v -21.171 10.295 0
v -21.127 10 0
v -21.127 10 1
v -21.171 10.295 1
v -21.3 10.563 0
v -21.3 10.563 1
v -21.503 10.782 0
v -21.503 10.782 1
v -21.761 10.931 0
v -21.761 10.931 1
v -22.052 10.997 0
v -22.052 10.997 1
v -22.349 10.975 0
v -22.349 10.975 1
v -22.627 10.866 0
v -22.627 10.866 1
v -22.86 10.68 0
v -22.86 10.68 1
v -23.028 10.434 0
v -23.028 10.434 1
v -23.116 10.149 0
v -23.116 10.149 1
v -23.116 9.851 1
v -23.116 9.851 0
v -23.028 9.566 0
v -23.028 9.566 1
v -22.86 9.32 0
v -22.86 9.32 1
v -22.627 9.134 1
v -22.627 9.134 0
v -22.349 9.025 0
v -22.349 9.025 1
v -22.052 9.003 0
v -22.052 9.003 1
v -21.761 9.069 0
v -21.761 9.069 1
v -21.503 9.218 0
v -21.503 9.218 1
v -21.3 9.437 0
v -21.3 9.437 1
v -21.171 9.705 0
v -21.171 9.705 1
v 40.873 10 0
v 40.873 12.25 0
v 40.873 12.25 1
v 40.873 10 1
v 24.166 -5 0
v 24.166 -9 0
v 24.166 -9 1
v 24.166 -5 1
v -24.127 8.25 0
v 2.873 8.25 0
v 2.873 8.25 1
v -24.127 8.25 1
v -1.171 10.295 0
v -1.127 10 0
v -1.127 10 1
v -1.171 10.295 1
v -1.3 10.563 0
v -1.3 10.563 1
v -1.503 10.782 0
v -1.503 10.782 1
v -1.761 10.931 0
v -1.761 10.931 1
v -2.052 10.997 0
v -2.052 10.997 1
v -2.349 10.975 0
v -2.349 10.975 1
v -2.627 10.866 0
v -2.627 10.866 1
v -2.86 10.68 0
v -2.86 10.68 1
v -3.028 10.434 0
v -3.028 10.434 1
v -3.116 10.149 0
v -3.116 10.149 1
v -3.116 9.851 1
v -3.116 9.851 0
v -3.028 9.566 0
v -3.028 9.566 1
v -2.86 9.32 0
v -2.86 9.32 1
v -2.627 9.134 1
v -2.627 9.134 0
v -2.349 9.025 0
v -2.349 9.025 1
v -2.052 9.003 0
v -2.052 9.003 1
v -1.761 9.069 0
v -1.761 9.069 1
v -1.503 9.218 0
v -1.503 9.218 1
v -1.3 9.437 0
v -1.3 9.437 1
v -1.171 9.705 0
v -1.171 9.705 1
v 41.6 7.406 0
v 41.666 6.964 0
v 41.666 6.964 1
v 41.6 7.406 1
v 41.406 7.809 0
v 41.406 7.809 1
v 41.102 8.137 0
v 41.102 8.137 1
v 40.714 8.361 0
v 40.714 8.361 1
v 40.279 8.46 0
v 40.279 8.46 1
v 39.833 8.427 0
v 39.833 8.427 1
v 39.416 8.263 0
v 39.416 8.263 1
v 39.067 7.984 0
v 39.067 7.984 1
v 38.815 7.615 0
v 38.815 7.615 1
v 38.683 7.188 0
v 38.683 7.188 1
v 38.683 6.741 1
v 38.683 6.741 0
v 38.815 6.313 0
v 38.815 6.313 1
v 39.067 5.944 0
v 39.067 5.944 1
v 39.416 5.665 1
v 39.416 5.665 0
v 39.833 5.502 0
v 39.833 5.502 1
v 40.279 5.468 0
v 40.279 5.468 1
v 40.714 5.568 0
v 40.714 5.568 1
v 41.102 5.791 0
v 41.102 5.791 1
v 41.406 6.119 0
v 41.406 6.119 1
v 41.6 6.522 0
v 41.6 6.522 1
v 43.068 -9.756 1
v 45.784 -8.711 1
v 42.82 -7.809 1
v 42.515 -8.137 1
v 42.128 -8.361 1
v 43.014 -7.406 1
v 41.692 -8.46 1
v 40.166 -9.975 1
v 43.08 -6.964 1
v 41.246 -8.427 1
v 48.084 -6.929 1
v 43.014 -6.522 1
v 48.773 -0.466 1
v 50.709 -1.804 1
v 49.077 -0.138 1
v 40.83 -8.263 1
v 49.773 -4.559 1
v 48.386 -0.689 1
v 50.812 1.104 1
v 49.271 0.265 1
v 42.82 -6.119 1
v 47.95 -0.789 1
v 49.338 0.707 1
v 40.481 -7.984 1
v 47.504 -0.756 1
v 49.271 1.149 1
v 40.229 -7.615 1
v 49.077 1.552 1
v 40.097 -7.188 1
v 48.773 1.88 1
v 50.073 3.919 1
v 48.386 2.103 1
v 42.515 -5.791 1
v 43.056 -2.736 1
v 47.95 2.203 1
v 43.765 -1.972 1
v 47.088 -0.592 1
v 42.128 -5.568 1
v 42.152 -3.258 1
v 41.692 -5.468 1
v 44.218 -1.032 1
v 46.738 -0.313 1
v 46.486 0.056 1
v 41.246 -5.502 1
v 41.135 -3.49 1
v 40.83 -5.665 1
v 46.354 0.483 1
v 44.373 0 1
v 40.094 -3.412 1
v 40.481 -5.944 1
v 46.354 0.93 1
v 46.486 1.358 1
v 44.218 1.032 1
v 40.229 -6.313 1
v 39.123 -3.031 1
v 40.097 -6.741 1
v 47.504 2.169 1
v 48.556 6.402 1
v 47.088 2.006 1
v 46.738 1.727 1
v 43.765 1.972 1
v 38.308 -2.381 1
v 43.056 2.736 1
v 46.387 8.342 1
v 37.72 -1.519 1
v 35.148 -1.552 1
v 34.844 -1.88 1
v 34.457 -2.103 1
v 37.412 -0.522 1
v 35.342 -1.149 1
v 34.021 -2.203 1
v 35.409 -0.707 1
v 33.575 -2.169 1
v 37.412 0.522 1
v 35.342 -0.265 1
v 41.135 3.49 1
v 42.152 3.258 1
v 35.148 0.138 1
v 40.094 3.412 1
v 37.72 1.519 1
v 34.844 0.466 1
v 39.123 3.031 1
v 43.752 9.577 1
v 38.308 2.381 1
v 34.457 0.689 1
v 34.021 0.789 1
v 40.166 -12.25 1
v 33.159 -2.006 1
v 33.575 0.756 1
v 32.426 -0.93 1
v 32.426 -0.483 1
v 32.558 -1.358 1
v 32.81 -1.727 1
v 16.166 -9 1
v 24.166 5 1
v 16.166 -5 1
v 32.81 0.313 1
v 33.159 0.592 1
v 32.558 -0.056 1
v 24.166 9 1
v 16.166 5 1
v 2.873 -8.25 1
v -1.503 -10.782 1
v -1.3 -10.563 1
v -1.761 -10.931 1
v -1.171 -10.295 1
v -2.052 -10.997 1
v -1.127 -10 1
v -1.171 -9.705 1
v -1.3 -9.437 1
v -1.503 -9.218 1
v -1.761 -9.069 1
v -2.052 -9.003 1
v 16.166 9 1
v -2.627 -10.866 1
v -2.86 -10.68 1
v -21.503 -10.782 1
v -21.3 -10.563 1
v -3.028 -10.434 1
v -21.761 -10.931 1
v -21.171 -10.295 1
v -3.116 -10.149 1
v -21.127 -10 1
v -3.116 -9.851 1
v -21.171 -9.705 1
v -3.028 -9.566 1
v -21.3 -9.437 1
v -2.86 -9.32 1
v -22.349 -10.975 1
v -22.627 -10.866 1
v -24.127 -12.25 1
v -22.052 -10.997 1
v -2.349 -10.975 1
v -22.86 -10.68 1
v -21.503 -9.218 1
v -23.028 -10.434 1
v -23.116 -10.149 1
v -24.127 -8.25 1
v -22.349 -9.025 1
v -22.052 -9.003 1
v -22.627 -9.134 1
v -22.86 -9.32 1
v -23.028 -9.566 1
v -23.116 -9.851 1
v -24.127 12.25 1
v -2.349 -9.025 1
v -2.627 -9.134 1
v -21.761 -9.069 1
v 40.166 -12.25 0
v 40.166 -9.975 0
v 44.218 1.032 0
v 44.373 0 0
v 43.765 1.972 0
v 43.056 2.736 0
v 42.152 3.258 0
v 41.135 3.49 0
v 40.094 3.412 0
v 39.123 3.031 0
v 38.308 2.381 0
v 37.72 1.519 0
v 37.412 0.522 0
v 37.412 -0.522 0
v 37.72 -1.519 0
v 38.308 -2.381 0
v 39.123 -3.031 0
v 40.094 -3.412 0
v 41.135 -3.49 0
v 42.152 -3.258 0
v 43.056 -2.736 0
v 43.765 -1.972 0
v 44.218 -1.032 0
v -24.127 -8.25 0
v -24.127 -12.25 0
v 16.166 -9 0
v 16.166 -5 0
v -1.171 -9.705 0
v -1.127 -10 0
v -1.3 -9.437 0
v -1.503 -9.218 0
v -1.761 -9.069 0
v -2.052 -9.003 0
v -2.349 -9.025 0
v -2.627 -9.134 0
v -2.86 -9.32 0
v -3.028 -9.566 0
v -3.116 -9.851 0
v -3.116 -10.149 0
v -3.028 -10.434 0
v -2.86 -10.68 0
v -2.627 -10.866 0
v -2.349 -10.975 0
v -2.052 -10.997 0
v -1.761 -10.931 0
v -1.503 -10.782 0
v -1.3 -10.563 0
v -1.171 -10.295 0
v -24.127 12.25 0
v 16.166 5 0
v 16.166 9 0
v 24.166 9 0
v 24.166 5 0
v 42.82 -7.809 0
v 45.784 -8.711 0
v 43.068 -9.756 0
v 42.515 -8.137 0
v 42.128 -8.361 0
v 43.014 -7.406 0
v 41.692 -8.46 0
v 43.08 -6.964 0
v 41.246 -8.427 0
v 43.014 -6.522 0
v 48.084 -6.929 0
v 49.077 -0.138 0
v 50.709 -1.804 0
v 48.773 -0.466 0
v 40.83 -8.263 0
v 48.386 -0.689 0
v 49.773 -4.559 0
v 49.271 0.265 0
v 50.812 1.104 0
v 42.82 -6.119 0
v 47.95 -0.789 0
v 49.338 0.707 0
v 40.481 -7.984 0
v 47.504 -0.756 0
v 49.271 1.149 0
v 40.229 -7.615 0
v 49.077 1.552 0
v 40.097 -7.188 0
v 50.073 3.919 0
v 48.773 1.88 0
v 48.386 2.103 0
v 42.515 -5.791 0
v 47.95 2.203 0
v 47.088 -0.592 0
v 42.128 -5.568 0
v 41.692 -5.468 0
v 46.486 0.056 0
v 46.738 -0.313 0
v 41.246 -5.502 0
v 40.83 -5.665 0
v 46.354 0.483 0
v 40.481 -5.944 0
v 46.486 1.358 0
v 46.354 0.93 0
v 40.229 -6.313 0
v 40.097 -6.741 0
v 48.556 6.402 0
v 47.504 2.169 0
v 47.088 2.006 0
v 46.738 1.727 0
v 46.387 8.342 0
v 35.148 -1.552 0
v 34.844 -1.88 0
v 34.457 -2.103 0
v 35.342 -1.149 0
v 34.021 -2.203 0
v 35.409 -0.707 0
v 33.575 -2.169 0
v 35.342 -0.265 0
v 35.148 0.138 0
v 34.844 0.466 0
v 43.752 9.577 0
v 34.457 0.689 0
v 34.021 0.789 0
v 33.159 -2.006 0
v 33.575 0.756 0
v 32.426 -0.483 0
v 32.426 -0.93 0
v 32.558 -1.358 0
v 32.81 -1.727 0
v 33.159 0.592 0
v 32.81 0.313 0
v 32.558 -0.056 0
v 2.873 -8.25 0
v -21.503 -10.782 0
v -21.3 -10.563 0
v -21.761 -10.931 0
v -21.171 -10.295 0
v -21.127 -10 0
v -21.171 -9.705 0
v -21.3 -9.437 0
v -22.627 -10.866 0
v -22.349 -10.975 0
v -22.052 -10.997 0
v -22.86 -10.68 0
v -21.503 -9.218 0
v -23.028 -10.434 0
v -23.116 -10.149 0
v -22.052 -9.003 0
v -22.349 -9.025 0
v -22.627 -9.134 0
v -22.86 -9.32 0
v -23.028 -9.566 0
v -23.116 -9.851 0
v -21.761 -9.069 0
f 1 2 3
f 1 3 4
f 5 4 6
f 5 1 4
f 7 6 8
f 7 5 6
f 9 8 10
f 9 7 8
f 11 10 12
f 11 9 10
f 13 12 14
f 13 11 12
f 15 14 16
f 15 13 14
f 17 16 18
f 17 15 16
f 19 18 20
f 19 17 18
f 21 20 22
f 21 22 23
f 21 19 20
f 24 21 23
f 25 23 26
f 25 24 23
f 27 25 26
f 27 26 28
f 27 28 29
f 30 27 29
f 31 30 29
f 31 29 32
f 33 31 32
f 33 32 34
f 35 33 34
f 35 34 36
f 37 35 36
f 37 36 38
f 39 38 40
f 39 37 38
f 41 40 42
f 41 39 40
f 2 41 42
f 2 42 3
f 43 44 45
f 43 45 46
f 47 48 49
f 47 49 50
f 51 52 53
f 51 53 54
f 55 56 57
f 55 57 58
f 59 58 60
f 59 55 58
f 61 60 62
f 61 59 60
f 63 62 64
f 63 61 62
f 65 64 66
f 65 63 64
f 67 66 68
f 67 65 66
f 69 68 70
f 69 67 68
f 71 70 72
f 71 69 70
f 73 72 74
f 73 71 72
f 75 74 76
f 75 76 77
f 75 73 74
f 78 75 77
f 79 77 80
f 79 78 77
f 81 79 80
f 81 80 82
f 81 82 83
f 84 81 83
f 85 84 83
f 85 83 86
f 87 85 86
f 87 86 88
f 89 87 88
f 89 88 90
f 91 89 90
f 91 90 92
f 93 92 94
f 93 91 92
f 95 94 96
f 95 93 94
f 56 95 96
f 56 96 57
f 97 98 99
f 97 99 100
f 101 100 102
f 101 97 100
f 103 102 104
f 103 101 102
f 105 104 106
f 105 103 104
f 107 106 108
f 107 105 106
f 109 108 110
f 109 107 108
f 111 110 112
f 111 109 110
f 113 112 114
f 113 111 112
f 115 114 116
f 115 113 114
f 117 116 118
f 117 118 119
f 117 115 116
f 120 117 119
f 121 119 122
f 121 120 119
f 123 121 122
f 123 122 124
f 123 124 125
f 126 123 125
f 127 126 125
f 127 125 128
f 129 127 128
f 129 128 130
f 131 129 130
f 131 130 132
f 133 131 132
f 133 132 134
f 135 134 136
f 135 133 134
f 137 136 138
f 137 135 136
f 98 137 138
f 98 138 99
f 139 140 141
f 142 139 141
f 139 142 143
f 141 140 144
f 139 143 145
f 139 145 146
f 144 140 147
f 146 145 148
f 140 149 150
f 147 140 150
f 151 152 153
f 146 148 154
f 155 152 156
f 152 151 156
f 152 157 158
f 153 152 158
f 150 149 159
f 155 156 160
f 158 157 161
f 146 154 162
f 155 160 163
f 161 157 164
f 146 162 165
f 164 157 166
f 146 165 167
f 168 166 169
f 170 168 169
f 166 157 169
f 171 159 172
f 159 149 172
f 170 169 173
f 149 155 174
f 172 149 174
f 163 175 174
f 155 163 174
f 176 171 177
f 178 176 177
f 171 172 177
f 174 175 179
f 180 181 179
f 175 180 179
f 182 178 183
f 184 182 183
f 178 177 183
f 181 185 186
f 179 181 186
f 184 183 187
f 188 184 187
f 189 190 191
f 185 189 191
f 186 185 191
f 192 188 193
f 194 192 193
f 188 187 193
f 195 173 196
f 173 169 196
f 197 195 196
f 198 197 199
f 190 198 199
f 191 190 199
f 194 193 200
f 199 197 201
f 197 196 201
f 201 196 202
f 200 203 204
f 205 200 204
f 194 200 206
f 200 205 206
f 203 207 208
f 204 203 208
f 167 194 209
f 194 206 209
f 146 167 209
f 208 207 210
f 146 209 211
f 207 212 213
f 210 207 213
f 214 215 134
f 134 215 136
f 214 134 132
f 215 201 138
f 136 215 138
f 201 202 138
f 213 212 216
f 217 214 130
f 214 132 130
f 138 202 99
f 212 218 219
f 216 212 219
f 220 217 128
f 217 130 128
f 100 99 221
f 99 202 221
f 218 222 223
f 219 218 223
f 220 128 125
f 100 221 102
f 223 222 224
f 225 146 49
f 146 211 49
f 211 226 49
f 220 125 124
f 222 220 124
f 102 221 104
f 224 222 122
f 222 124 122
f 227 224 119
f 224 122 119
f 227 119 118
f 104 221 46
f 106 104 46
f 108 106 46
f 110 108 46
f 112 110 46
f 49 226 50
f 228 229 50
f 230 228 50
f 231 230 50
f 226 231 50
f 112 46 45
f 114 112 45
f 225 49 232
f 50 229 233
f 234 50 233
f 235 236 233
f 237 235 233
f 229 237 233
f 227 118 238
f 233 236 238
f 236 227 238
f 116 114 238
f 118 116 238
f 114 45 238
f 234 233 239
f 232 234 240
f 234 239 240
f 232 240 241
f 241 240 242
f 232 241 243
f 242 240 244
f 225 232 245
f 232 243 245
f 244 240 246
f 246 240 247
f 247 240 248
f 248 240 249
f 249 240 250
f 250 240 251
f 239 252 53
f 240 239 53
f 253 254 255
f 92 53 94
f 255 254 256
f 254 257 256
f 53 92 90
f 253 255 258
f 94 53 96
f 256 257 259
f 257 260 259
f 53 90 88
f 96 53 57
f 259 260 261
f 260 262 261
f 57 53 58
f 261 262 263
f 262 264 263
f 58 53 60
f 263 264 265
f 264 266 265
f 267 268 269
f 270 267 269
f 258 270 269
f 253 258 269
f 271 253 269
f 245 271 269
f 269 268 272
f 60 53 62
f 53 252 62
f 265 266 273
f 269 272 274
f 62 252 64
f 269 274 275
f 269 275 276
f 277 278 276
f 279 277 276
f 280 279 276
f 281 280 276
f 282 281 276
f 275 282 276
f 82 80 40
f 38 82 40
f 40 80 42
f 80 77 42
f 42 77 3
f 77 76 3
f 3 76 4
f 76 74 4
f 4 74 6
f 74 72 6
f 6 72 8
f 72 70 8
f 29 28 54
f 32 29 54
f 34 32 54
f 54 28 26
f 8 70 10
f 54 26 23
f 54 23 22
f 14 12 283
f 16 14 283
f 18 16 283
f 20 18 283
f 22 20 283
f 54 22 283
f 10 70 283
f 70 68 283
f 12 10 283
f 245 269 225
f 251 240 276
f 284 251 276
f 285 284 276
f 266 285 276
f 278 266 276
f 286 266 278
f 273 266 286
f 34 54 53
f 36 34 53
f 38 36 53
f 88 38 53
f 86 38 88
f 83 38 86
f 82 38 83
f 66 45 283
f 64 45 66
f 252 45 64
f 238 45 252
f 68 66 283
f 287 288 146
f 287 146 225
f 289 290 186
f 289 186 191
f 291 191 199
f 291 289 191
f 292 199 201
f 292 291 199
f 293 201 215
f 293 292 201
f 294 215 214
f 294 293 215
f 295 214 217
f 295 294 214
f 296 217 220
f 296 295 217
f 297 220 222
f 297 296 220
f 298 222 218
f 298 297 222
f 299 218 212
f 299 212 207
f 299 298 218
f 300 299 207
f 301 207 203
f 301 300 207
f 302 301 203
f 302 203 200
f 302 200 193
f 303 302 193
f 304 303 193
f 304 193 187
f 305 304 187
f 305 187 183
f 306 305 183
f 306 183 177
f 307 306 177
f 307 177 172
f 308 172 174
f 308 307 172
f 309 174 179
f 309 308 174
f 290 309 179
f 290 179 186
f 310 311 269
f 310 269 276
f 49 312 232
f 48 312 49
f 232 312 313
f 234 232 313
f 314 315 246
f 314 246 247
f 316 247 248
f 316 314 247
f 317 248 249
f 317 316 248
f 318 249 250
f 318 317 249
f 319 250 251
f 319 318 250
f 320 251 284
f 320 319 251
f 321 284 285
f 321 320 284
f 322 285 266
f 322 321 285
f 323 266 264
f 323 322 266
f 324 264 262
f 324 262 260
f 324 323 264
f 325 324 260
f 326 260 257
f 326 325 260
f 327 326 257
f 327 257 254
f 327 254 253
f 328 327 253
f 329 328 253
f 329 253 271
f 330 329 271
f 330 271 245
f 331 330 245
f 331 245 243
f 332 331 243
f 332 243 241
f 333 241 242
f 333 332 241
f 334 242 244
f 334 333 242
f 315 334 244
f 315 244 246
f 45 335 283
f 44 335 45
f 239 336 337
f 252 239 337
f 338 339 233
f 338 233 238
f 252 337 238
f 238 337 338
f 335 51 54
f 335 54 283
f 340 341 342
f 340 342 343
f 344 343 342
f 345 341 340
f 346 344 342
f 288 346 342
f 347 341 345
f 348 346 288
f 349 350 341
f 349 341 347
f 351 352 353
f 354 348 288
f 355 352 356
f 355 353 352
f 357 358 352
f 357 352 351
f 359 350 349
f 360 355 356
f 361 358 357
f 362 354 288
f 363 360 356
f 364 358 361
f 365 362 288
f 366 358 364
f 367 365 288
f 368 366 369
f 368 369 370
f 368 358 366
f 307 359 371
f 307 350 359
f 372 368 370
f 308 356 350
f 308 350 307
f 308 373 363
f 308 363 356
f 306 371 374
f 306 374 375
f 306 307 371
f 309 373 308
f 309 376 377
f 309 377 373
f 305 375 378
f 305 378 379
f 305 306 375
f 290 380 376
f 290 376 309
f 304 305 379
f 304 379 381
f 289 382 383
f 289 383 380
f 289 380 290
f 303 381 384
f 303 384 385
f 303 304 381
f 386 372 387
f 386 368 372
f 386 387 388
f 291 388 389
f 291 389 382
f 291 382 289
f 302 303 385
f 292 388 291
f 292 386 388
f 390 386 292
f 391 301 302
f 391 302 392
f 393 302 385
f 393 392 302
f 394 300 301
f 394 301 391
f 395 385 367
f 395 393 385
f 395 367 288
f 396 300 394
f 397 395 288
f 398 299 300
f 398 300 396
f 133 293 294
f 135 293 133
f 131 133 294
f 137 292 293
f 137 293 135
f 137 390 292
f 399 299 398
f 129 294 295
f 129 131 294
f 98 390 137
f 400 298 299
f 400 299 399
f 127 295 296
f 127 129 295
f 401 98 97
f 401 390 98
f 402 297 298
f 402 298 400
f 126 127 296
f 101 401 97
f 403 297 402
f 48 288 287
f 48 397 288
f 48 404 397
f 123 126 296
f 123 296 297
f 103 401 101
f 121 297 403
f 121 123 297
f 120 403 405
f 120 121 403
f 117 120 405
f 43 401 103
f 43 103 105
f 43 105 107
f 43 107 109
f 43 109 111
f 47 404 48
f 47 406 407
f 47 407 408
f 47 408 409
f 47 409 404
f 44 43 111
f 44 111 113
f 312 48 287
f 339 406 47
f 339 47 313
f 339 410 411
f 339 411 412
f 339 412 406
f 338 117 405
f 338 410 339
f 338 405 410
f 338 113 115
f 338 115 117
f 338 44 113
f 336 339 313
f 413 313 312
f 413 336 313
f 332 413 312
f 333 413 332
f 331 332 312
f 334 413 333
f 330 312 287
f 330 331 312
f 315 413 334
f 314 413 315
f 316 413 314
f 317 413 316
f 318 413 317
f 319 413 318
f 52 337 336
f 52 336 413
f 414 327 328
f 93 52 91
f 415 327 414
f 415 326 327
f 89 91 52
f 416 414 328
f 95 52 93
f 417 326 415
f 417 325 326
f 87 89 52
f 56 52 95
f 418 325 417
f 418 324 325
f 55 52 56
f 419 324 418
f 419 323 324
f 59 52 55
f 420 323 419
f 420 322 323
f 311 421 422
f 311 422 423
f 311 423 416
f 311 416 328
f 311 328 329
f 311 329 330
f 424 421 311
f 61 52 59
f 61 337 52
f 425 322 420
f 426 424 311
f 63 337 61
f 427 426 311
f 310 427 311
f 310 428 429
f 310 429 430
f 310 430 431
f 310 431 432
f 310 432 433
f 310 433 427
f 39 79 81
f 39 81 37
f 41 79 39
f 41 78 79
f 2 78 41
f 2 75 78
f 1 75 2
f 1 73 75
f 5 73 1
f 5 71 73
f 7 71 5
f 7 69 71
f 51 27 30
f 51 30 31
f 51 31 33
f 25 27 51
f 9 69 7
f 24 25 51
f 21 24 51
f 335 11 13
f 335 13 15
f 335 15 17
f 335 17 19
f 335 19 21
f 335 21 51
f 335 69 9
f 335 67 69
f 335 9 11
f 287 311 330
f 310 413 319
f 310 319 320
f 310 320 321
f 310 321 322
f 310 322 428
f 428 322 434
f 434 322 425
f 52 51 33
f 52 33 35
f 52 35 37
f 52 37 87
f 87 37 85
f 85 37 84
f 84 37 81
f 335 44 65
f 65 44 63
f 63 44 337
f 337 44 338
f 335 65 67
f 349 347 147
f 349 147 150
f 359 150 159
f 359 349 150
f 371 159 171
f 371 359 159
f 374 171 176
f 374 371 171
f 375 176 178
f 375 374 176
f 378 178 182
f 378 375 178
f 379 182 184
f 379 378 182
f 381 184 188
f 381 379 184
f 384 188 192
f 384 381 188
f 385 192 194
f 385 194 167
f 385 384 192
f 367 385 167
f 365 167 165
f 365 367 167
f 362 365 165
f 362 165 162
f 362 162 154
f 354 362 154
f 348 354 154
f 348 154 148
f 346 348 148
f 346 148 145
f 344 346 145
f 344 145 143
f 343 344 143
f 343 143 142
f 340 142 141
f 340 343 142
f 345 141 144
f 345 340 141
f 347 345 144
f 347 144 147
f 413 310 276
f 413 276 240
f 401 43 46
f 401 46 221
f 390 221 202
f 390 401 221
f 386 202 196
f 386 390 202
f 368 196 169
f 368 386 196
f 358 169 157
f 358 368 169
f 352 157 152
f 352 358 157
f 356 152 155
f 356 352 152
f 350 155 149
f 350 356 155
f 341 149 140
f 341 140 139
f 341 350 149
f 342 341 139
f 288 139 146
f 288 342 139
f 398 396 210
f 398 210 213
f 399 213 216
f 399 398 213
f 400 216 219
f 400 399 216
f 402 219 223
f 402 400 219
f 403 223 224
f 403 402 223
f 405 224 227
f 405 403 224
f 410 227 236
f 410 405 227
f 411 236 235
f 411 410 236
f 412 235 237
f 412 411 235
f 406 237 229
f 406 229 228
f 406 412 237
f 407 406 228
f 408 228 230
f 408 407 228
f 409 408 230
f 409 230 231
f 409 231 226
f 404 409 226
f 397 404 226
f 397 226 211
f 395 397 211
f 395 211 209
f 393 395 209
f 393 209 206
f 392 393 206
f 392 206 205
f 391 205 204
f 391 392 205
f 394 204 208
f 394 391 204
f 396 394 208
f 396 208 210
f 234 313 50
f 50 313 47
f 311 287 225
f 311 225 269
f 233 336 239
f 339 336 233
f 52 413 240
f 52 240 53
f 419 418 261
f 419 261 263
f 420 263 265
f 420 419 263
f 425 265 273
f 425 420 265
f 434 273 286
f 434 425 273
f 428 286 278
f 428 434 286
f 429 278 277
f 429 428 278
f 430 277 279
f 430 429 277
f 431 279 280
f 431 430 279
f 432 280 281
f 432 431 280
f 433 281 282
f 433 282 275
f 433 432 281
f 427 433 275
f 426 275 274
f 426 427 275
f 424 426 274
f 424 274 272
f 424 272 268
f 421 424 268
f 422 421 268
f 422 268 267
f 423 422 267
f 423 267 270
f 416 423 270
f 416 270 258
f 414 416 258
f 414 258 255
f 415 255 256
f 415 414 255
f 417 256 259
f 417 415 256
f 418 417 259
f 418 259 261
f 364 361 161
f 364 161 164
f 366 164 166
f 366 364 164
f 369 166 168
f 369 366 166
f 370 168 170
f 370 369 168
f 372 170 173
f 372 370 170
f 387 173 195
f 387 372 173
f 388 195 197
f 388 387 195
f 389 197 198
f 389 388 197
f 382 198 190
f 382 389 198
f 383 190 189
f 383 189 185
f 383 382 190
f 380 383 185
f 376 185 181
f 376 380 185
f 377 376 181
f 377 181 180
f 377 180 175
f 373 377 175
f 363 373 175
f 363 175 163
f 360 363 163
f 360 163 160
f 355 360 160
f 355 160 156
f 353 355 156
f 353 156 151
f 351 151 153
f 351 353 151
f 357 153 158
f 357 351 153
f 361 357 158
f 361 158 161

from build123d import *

# Parameters (mm, degrees)
SKETCH1_R           = 1.5
SKETCH1_R_2         = 3.5
SKETCH1_R_3         = 1
SKETCH1_W           = 8
SKETCH1_H           = 4
BOSS_EXTRUDE1_DEPTH = 1


with BuildPart() as part:
    # Sketch1 → Boss-Extrude1 (new body)
    with BuildSketch(Plane.XY):
        with BuildLine():
            Line((-4.12667801, 12.25), (5.87332199, 12.25))
            Line((5.87332199, 12.25), (40.87332199, 12.25))
            Line((40.87332199, 12.25), (40.87332199, 10))
            ThreePointArc((40.87332199, 10), (50.867066736, -0.353646663), (40.166471095, -9.974986808))
            Line((40.166471095, -9.974986808), (40.166471095, -12.25))
            Line((40.166471095, -12.25), (5.87332199, -12.25))
            Line((5.87332199, -12.25), (-4.12667801, -12.25))
            Line((-4.12667801, -12.25), (-24.12667801, -12.25))
            Line((-24.12667801, -12.25), (-24.12667801, -8.25))
            Line((-24.12667801, -8.25), (2.87332199, -8.25))
            Line((2.87332199, -8.25), (2.87332199, 8.25))
            Line((2.87332199, 8.25), (-24.12667801, 8.25))
            Line((-24.12667801, 8.25), (-24.12667801, 12.25))
            Line((-24.12667801, 12.25), (-4.12667801, 12.25))
        make_face()
        with Locations((40.166439084, 6.964216866)):
            Circle(SKETCH1_R, mode=Mode.SUBTRACT)
        with Locations((47.837538856, 0.706882906)):
            Circle(SKETCH1_R, mode=Mode.SUBTRACT)
        with Locations((41.580204896, -6.964216866)):
            Circle(SKETCH1_R, mode=Mode.SUBTRACT)
        with Locations((33.909105124, -0.706882906)):
            Circle(SKETCH1_R, mode=Mode.SUBTRACT)
        with Locations((40.87332199, 0)):
            Circle(SKETCH1_R_2, mode=Mode.SUBTRACT)
        with Locations((-2.12667801, 10)):
            Circle(SKETCH1_R_3, mode=Mode.SUBTRACT)
        with Locations((-2.12667801, -10)):
            Circle(SKETCH1_R_3, mode=Mode.SUBTRACT)
        with Locations((-22.12667801, 10)):
            Circle(SKETCH1_R_3, mode=Mode.SUBTRACT)
        with Locations((-22.12667801, -10)):
            Circle(SKETCH1_R_3, mode=Mode.SUBTRACT)
        with Locations((20.166471095, 7)):
            Rectangle(SKETCH1_W, SKETCH1_H, mode=Mode.SUBTRACT)
        with Locations((20.166471095, -7)):
            Rectangle(SKETCH1_W, SKETCH1_H, mode=Mode.SUBTRACT)
    extrude(amount=BOSS_EXTRUDE1_DEPTH)


solid = part.part
